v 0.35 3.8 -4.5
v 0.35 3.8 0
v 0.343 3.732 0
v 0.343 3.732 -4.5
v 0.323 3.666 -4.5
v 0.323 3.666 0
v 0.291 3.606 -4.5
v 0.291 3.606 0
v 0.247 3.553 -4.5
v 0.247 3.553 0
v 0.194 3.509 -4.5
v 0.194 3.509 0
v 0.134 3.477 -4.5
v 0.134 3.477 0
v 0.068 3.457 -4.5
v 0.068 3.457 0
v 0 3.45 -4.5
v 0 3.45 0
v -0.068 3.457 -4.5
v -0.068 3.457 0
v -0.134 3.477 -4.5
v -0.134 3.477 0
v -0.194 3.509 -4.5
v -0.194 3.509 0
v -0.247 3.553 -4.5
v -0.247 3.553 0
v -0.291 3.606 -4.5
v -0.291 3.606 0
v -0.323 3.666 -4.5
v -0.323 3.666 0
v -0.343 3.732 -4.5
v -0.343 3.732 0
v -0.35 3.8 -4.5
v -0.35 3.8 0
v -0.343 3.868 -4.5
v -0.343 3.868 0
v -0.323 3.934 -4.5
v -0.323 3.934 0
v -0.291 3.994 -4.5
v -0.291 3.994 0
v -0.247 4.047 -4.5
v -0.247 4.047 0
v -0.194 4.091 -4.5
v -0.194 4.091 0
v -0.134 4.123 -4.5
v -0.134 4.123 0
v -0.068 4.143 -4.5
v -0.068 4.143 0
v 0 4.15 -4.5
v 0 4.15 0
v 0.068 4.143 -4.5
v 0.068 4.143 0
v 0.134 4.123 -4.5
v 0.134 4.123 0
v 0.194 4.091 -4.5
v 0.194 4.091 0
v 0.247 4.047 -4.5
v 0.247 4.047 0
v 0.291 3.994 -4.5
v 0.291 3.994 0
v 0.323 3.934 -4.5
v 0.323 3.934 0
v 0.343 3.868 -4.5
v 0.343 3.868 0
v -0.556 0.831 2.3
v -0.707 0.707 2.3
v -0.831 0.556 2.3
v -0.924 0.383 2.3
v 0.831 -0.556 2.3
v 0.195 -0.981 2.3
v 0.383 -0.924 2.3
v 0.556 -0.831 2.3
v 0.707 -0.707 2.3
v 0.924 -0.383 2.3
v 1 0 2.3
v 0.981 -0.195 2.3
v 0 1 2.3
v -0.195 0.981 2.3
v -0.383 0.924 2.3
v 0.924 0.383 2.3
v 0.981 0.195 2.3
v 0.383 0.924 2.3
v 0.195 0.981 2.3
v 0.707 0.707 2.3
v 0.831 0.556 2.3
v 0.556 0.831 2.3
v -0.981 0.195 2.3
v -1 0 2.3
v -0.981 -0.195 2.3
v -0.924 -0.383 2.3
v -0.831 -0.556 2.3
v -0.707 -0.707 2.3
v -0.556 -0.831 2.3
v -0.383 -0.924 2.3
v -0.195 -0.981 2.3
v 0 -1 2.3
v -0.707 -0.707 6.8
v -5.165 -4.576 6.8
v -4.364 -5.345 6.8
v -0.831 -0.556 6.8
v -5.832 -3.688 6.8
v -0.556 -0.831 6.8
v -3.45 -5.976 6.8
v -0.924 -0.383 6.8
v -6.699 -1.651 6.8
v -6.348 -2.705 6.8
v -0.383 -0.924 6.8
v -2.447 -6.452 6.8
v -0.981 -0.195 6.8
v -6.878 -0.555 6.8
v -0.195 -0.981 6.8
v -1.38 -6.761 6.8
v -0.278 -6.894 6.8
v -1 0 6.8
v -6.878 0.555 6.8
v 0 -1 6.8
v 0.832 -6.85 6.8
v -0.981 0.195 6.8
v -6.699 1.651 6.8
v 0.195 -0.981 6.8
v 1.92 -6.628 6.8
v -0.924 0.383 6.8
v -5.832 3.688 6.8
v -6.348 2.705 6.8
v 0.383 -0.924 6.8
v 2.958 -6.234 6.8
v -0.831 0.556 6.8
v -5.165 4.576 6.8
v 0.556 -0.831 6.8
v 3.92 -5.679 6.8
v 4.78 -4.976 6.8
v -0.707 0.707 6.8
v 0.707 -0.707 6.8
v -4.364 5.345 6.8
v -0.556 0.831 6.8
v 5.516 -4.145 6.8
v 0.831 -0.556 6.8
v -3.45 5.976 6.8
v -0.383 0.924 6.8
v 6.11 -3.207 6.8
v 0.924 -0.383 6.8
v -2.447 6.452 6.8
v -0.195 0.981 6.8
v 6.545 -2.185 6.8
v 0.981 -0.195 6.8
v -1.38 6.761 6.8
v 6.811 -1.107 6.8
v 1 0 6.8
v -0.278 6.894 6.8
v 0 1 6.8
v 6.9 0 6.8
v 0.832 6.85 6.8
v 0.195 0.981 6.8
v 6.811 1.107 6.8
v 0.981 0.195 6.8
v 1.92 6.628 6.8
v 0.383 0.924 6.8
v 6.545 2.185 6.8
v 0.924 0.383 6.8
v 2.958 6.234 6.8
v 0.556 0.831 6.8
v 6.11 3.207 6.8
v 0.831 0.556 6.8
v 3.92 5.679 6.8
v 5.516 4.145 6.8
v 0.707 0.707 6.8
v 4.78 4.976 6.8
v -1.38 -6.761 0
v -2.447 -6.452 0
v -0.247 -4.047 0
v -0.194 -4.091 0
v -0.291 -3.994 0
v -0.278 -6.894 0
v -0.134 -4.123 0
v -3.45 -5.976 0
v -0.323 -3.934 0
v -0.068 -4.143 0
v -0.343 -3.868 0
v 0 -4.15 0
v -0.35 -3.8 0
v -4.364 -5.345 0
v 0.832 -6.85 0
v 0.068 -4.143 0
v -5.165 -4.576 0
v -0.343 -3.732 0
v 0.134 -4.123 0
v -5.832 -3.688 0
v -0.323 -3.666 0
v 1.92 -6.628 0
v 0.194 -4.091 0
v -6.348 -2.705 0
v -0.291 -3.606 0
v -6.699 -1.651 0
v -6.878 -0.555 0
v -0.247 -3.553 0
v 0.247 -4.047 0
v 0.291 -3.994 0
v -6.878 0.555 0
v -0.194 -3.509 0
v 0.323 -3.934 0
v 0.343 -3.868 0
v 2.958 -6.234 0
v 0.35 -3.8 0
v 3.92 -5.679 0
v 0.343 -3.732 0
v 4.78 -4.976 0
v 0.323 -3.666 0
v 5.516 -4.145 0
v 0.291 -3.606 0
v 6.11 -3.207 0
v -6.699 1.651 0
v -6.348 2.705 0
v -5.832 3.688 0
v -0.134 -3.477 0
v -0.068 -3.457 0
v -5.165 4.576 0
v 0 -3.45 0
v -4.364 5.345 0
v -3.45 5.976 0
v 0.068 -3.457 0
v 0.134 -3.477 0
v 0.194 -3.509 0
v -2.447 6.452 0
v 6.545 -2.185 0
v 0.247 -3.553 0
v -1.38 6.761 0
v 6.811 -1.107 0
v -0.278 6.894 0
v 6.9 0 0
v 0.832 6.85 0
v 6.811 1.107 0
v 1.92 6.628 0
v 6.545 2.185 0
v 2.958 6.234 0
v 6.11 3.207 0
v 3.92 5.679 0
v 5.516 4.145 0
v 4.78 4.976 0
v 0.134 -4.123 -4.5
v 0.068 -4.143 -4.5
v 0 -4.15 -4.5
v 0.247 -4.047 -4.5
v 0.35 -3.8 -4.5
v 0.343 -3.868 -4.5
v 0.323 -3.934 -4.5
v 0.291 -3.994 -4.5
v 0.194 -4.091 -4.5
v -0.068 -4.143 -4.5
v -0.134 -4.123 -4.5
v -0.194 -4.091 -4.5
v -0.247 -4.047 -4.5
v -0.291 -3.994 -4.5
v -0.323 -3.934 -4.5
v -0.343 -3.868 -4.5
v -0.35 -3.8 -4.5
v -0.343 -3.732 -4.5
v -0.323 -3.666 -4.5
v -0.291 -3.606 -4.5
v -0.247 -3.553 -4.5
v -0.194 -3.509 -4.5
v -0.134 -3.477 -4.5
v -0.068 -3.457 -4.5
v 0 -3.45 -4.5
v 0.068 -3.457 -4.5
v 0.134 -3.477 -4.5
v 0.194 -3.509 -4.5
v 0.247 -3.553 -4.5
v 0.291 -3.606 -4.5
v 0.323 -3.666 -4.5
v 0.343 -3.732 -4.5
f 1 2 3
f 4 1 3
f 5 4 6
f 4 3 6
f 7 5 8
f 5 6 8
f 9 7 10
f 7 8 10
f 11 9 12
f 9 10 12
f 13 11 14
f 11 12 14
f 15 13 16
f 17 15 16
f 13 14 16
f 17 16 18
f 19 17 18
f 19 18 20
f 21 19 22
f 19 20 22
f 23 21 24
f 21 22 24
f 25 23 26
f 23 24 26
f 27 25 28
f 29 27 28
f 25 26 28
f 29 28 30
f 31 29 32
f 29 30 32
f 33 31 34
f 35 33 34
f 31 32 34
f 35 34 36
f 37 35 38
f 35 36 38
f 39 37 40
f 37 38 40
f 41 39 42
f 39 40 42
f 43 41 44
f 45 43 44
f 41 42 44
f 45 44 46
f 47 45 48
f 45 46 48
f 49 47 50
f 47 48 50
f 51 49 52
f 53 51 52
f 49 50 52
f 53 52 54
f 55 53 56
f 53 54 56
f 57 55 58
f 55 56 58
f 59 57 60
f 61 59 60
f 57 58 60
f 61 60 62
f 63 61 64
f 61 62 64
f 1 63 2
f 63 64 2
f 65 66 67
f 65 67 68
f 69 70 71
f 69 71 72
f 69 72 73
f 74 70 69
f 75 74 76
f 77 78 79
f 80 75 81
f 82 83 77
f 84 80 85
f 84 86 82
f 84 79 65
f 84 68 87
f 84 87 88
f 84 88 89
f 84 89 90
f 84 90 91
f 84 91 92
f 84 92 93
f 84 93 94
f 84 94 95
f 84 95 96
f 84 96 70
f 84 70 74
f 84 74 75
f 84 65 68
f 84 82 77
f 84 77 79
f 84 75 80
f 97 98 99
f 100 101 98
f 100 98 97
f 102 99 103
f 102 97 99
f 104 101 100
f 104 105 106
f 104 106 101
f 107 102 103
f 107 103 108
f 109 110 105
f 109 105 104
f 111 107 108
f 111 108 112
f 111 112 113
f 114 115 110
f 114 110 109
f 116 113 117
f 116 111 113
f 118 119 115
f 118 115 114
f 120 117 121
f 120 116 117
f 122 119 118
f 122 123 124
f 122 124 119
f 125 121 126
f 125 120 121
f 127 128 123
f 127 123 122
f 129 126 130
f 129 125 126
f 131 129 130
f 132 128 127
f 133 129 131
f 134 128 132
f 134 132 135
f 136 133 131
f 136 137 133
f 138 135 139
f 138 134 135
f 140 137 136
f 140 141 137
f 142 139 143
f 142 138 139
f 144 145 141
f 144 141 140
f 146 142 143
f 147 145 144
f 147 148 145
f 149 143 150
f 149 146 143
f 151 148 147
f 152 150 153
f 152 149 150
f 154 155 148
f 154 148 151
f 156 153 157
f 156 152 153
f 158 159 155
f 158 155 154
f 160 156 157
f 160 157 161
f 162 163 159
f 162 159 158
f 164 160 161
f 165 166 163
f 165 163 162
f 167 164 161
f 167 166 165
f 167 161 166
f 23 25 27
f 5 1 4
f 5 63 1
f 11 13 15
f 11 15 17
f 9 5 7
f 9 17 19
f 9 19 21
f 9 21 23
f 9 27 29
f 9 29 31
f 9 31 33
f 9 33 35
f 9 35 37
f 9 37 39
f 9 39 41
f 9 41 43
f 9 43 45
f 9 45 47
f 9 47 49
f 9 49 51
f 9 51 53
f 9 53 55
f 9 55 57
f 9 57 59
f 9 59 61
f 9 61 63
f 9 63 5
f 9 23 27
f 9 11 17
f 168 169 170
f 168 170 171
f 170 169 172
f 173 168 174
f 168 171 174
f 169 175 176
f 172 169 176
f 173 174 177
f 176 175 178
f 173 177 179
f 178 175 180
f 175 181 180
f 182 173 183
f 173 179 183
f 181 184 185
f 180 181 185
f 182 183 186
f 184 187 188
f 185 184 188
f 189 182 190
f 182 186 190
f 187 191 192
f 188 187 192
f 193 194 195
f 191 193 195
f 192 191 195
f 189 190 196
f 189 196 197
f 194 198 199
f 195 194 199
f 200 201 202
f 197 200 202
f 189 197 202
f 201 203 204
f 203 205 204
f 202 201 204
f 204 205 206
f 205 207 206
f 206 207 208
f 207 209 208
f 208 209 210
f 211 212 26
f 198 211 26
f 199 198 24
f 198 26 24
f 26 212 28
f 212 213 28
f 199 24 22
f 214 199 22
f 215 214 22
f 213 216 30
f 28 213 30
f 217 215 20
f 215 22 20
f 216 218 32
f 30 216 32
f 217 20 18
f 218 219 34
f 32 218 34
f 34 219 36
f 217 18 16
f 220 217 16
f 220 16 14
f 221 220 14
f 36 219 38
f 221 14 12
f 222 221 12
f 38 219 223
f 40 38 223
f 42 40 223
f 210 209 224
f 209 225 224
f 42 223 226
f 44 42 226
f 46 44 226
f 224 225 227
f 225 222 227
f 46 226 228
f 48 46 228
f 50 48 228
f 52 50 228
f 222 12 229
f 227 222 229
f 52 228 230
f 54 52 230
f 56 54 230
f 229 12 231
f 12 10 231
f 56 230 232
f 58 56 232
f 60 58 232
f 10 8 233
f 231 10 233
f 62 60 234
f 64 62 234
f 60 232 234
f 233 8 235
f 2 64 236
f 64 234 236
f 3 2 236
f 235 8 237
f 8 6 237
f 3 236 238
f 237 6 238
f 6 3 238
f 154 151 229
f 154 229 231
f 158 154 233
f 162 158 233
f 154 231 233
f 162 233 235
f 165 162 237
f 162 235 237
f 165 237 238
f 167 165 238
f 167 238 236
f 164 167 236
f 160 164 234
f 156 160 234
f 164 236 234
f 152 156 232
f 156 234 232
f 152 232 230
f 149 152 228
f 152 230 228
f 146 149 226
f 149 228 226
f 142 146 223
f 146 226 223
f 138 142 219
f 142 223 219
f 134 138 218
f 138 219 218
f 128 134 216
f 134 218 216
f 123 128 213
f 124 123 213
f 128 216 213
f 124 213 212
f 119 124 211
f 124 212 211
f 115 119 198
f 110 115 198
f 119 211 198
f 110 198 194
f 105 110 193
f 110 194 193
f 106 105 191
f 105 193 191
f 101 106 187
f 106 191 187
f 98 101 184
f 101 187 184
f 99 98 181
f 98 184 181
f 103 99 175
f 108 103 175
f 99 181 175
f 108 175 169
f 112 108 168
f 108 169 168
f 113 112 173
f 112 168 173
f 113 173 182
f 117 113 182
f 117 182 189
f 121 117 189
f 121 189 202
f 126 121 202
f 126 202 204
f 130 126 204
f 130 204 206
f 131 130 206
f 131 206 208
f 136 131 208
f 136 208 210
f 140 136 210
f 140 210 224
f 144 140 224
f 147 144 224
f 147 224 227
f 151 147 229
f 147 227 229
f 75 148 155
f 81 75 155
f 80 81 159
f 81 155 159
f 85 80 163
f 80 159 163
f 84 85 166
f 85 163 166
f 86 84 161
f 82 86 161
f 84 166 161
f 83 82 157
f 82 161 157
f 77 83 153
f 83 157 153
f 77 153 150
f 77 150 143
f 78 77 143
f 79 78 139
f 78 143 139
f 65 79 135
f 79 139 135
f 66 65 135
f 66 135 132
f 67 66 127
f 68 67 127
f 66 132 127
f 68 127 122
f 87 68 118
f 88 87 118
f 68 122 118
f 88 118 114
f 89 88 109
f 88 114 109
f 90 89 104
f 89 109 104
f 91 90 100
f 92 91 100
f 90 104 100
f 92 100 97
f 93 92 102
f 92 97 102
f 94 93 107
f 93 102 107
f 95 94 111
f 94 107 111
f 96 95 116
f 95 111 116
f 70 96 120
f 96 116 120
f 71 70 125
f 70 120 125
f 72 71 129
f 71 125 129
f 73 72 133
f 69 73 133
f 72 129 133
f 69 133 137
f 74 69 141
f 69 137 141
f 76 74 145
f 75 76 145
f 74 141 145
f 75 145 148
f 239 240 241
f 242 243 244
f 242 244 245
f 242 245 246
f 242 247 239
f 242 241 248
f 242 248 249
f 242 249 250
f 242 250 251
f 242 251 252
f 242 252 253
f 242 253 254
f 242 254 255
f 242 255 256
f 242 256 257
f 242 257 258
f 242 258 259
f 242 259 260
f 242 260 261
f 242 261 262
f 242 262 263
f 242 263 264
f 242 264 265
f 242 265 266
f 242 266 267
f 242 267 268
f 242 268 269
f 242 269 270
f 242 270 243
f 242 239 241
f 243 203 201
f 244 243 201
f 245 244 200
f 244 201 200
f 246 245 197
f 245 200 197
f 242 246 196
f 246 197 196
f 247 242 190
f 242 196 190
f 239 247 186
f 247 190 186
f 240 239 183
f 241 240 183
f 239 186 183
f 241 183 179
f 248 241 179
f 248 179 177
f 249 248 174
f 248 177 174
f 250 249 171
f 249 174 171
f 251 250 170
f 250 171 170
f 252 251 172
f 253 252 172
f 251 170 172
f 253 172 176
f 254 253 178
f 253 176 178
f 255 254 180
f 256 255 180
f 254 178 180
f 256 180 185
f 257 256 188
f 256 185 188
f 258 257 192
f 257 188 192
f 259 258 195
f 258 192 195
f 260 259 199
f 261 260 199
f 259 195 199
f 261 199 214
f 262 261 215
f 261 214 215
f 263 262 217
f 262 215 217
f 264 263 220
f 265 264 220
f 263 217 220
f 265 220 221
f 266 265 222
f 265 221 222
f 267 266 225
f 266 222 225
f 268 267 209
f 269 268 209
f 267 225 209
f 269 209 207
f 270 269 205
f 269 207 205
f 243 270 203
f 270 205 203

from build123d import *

# Parameters (mm, degrees)
SKETCH_1_R          = 6.9
EXTRUDE_1_DEPTH     = 6.8
SKETCH_2_R          = 0.35
EXTRUDE_2_DEPTH     = 4.5
SKETCH_3_R          = 1
CUT_EXTRUDE_1_DEPTH = 4.5


with BuildPart() as part:
    # Эскиз1 → Бобышка-Вытянуть1 (new body)
    with BuildSketch(Plane.XY):
        Circle(SKETCH_1_R)
    extrude(amount=EXTRUDE_1_DEPTH)

    # Эскиз2 → Бобышка-Вытянуть2 (add)
    with BuildSketch(Plane(origin=(0, 0, 0), x_dir=(-1, 0, 0), z_dir=(0, 0, -1))):
        with Locations(Location((0, 3.8, 0), (0, 0, 180))):
            Circle(SKETCH_2_R)
        with Locations(Location((0, -3.8, 0), (0, 0, 180))):
            Circle(SKETCH_2_R)
    extrude(amount=EXTRUDE_2_DEPTH)

    # Эскиз3 → Вырез-Вытянуть1 (cut)
    with BuildSketch(Plane.XY.offset(6.8)):
        Circle(SKETCH_3_R)
    extrude(amount=-CUT_EXTRUDE_1_DEPTH, mode=Mode.SUBTRACT)


solid = part.part
